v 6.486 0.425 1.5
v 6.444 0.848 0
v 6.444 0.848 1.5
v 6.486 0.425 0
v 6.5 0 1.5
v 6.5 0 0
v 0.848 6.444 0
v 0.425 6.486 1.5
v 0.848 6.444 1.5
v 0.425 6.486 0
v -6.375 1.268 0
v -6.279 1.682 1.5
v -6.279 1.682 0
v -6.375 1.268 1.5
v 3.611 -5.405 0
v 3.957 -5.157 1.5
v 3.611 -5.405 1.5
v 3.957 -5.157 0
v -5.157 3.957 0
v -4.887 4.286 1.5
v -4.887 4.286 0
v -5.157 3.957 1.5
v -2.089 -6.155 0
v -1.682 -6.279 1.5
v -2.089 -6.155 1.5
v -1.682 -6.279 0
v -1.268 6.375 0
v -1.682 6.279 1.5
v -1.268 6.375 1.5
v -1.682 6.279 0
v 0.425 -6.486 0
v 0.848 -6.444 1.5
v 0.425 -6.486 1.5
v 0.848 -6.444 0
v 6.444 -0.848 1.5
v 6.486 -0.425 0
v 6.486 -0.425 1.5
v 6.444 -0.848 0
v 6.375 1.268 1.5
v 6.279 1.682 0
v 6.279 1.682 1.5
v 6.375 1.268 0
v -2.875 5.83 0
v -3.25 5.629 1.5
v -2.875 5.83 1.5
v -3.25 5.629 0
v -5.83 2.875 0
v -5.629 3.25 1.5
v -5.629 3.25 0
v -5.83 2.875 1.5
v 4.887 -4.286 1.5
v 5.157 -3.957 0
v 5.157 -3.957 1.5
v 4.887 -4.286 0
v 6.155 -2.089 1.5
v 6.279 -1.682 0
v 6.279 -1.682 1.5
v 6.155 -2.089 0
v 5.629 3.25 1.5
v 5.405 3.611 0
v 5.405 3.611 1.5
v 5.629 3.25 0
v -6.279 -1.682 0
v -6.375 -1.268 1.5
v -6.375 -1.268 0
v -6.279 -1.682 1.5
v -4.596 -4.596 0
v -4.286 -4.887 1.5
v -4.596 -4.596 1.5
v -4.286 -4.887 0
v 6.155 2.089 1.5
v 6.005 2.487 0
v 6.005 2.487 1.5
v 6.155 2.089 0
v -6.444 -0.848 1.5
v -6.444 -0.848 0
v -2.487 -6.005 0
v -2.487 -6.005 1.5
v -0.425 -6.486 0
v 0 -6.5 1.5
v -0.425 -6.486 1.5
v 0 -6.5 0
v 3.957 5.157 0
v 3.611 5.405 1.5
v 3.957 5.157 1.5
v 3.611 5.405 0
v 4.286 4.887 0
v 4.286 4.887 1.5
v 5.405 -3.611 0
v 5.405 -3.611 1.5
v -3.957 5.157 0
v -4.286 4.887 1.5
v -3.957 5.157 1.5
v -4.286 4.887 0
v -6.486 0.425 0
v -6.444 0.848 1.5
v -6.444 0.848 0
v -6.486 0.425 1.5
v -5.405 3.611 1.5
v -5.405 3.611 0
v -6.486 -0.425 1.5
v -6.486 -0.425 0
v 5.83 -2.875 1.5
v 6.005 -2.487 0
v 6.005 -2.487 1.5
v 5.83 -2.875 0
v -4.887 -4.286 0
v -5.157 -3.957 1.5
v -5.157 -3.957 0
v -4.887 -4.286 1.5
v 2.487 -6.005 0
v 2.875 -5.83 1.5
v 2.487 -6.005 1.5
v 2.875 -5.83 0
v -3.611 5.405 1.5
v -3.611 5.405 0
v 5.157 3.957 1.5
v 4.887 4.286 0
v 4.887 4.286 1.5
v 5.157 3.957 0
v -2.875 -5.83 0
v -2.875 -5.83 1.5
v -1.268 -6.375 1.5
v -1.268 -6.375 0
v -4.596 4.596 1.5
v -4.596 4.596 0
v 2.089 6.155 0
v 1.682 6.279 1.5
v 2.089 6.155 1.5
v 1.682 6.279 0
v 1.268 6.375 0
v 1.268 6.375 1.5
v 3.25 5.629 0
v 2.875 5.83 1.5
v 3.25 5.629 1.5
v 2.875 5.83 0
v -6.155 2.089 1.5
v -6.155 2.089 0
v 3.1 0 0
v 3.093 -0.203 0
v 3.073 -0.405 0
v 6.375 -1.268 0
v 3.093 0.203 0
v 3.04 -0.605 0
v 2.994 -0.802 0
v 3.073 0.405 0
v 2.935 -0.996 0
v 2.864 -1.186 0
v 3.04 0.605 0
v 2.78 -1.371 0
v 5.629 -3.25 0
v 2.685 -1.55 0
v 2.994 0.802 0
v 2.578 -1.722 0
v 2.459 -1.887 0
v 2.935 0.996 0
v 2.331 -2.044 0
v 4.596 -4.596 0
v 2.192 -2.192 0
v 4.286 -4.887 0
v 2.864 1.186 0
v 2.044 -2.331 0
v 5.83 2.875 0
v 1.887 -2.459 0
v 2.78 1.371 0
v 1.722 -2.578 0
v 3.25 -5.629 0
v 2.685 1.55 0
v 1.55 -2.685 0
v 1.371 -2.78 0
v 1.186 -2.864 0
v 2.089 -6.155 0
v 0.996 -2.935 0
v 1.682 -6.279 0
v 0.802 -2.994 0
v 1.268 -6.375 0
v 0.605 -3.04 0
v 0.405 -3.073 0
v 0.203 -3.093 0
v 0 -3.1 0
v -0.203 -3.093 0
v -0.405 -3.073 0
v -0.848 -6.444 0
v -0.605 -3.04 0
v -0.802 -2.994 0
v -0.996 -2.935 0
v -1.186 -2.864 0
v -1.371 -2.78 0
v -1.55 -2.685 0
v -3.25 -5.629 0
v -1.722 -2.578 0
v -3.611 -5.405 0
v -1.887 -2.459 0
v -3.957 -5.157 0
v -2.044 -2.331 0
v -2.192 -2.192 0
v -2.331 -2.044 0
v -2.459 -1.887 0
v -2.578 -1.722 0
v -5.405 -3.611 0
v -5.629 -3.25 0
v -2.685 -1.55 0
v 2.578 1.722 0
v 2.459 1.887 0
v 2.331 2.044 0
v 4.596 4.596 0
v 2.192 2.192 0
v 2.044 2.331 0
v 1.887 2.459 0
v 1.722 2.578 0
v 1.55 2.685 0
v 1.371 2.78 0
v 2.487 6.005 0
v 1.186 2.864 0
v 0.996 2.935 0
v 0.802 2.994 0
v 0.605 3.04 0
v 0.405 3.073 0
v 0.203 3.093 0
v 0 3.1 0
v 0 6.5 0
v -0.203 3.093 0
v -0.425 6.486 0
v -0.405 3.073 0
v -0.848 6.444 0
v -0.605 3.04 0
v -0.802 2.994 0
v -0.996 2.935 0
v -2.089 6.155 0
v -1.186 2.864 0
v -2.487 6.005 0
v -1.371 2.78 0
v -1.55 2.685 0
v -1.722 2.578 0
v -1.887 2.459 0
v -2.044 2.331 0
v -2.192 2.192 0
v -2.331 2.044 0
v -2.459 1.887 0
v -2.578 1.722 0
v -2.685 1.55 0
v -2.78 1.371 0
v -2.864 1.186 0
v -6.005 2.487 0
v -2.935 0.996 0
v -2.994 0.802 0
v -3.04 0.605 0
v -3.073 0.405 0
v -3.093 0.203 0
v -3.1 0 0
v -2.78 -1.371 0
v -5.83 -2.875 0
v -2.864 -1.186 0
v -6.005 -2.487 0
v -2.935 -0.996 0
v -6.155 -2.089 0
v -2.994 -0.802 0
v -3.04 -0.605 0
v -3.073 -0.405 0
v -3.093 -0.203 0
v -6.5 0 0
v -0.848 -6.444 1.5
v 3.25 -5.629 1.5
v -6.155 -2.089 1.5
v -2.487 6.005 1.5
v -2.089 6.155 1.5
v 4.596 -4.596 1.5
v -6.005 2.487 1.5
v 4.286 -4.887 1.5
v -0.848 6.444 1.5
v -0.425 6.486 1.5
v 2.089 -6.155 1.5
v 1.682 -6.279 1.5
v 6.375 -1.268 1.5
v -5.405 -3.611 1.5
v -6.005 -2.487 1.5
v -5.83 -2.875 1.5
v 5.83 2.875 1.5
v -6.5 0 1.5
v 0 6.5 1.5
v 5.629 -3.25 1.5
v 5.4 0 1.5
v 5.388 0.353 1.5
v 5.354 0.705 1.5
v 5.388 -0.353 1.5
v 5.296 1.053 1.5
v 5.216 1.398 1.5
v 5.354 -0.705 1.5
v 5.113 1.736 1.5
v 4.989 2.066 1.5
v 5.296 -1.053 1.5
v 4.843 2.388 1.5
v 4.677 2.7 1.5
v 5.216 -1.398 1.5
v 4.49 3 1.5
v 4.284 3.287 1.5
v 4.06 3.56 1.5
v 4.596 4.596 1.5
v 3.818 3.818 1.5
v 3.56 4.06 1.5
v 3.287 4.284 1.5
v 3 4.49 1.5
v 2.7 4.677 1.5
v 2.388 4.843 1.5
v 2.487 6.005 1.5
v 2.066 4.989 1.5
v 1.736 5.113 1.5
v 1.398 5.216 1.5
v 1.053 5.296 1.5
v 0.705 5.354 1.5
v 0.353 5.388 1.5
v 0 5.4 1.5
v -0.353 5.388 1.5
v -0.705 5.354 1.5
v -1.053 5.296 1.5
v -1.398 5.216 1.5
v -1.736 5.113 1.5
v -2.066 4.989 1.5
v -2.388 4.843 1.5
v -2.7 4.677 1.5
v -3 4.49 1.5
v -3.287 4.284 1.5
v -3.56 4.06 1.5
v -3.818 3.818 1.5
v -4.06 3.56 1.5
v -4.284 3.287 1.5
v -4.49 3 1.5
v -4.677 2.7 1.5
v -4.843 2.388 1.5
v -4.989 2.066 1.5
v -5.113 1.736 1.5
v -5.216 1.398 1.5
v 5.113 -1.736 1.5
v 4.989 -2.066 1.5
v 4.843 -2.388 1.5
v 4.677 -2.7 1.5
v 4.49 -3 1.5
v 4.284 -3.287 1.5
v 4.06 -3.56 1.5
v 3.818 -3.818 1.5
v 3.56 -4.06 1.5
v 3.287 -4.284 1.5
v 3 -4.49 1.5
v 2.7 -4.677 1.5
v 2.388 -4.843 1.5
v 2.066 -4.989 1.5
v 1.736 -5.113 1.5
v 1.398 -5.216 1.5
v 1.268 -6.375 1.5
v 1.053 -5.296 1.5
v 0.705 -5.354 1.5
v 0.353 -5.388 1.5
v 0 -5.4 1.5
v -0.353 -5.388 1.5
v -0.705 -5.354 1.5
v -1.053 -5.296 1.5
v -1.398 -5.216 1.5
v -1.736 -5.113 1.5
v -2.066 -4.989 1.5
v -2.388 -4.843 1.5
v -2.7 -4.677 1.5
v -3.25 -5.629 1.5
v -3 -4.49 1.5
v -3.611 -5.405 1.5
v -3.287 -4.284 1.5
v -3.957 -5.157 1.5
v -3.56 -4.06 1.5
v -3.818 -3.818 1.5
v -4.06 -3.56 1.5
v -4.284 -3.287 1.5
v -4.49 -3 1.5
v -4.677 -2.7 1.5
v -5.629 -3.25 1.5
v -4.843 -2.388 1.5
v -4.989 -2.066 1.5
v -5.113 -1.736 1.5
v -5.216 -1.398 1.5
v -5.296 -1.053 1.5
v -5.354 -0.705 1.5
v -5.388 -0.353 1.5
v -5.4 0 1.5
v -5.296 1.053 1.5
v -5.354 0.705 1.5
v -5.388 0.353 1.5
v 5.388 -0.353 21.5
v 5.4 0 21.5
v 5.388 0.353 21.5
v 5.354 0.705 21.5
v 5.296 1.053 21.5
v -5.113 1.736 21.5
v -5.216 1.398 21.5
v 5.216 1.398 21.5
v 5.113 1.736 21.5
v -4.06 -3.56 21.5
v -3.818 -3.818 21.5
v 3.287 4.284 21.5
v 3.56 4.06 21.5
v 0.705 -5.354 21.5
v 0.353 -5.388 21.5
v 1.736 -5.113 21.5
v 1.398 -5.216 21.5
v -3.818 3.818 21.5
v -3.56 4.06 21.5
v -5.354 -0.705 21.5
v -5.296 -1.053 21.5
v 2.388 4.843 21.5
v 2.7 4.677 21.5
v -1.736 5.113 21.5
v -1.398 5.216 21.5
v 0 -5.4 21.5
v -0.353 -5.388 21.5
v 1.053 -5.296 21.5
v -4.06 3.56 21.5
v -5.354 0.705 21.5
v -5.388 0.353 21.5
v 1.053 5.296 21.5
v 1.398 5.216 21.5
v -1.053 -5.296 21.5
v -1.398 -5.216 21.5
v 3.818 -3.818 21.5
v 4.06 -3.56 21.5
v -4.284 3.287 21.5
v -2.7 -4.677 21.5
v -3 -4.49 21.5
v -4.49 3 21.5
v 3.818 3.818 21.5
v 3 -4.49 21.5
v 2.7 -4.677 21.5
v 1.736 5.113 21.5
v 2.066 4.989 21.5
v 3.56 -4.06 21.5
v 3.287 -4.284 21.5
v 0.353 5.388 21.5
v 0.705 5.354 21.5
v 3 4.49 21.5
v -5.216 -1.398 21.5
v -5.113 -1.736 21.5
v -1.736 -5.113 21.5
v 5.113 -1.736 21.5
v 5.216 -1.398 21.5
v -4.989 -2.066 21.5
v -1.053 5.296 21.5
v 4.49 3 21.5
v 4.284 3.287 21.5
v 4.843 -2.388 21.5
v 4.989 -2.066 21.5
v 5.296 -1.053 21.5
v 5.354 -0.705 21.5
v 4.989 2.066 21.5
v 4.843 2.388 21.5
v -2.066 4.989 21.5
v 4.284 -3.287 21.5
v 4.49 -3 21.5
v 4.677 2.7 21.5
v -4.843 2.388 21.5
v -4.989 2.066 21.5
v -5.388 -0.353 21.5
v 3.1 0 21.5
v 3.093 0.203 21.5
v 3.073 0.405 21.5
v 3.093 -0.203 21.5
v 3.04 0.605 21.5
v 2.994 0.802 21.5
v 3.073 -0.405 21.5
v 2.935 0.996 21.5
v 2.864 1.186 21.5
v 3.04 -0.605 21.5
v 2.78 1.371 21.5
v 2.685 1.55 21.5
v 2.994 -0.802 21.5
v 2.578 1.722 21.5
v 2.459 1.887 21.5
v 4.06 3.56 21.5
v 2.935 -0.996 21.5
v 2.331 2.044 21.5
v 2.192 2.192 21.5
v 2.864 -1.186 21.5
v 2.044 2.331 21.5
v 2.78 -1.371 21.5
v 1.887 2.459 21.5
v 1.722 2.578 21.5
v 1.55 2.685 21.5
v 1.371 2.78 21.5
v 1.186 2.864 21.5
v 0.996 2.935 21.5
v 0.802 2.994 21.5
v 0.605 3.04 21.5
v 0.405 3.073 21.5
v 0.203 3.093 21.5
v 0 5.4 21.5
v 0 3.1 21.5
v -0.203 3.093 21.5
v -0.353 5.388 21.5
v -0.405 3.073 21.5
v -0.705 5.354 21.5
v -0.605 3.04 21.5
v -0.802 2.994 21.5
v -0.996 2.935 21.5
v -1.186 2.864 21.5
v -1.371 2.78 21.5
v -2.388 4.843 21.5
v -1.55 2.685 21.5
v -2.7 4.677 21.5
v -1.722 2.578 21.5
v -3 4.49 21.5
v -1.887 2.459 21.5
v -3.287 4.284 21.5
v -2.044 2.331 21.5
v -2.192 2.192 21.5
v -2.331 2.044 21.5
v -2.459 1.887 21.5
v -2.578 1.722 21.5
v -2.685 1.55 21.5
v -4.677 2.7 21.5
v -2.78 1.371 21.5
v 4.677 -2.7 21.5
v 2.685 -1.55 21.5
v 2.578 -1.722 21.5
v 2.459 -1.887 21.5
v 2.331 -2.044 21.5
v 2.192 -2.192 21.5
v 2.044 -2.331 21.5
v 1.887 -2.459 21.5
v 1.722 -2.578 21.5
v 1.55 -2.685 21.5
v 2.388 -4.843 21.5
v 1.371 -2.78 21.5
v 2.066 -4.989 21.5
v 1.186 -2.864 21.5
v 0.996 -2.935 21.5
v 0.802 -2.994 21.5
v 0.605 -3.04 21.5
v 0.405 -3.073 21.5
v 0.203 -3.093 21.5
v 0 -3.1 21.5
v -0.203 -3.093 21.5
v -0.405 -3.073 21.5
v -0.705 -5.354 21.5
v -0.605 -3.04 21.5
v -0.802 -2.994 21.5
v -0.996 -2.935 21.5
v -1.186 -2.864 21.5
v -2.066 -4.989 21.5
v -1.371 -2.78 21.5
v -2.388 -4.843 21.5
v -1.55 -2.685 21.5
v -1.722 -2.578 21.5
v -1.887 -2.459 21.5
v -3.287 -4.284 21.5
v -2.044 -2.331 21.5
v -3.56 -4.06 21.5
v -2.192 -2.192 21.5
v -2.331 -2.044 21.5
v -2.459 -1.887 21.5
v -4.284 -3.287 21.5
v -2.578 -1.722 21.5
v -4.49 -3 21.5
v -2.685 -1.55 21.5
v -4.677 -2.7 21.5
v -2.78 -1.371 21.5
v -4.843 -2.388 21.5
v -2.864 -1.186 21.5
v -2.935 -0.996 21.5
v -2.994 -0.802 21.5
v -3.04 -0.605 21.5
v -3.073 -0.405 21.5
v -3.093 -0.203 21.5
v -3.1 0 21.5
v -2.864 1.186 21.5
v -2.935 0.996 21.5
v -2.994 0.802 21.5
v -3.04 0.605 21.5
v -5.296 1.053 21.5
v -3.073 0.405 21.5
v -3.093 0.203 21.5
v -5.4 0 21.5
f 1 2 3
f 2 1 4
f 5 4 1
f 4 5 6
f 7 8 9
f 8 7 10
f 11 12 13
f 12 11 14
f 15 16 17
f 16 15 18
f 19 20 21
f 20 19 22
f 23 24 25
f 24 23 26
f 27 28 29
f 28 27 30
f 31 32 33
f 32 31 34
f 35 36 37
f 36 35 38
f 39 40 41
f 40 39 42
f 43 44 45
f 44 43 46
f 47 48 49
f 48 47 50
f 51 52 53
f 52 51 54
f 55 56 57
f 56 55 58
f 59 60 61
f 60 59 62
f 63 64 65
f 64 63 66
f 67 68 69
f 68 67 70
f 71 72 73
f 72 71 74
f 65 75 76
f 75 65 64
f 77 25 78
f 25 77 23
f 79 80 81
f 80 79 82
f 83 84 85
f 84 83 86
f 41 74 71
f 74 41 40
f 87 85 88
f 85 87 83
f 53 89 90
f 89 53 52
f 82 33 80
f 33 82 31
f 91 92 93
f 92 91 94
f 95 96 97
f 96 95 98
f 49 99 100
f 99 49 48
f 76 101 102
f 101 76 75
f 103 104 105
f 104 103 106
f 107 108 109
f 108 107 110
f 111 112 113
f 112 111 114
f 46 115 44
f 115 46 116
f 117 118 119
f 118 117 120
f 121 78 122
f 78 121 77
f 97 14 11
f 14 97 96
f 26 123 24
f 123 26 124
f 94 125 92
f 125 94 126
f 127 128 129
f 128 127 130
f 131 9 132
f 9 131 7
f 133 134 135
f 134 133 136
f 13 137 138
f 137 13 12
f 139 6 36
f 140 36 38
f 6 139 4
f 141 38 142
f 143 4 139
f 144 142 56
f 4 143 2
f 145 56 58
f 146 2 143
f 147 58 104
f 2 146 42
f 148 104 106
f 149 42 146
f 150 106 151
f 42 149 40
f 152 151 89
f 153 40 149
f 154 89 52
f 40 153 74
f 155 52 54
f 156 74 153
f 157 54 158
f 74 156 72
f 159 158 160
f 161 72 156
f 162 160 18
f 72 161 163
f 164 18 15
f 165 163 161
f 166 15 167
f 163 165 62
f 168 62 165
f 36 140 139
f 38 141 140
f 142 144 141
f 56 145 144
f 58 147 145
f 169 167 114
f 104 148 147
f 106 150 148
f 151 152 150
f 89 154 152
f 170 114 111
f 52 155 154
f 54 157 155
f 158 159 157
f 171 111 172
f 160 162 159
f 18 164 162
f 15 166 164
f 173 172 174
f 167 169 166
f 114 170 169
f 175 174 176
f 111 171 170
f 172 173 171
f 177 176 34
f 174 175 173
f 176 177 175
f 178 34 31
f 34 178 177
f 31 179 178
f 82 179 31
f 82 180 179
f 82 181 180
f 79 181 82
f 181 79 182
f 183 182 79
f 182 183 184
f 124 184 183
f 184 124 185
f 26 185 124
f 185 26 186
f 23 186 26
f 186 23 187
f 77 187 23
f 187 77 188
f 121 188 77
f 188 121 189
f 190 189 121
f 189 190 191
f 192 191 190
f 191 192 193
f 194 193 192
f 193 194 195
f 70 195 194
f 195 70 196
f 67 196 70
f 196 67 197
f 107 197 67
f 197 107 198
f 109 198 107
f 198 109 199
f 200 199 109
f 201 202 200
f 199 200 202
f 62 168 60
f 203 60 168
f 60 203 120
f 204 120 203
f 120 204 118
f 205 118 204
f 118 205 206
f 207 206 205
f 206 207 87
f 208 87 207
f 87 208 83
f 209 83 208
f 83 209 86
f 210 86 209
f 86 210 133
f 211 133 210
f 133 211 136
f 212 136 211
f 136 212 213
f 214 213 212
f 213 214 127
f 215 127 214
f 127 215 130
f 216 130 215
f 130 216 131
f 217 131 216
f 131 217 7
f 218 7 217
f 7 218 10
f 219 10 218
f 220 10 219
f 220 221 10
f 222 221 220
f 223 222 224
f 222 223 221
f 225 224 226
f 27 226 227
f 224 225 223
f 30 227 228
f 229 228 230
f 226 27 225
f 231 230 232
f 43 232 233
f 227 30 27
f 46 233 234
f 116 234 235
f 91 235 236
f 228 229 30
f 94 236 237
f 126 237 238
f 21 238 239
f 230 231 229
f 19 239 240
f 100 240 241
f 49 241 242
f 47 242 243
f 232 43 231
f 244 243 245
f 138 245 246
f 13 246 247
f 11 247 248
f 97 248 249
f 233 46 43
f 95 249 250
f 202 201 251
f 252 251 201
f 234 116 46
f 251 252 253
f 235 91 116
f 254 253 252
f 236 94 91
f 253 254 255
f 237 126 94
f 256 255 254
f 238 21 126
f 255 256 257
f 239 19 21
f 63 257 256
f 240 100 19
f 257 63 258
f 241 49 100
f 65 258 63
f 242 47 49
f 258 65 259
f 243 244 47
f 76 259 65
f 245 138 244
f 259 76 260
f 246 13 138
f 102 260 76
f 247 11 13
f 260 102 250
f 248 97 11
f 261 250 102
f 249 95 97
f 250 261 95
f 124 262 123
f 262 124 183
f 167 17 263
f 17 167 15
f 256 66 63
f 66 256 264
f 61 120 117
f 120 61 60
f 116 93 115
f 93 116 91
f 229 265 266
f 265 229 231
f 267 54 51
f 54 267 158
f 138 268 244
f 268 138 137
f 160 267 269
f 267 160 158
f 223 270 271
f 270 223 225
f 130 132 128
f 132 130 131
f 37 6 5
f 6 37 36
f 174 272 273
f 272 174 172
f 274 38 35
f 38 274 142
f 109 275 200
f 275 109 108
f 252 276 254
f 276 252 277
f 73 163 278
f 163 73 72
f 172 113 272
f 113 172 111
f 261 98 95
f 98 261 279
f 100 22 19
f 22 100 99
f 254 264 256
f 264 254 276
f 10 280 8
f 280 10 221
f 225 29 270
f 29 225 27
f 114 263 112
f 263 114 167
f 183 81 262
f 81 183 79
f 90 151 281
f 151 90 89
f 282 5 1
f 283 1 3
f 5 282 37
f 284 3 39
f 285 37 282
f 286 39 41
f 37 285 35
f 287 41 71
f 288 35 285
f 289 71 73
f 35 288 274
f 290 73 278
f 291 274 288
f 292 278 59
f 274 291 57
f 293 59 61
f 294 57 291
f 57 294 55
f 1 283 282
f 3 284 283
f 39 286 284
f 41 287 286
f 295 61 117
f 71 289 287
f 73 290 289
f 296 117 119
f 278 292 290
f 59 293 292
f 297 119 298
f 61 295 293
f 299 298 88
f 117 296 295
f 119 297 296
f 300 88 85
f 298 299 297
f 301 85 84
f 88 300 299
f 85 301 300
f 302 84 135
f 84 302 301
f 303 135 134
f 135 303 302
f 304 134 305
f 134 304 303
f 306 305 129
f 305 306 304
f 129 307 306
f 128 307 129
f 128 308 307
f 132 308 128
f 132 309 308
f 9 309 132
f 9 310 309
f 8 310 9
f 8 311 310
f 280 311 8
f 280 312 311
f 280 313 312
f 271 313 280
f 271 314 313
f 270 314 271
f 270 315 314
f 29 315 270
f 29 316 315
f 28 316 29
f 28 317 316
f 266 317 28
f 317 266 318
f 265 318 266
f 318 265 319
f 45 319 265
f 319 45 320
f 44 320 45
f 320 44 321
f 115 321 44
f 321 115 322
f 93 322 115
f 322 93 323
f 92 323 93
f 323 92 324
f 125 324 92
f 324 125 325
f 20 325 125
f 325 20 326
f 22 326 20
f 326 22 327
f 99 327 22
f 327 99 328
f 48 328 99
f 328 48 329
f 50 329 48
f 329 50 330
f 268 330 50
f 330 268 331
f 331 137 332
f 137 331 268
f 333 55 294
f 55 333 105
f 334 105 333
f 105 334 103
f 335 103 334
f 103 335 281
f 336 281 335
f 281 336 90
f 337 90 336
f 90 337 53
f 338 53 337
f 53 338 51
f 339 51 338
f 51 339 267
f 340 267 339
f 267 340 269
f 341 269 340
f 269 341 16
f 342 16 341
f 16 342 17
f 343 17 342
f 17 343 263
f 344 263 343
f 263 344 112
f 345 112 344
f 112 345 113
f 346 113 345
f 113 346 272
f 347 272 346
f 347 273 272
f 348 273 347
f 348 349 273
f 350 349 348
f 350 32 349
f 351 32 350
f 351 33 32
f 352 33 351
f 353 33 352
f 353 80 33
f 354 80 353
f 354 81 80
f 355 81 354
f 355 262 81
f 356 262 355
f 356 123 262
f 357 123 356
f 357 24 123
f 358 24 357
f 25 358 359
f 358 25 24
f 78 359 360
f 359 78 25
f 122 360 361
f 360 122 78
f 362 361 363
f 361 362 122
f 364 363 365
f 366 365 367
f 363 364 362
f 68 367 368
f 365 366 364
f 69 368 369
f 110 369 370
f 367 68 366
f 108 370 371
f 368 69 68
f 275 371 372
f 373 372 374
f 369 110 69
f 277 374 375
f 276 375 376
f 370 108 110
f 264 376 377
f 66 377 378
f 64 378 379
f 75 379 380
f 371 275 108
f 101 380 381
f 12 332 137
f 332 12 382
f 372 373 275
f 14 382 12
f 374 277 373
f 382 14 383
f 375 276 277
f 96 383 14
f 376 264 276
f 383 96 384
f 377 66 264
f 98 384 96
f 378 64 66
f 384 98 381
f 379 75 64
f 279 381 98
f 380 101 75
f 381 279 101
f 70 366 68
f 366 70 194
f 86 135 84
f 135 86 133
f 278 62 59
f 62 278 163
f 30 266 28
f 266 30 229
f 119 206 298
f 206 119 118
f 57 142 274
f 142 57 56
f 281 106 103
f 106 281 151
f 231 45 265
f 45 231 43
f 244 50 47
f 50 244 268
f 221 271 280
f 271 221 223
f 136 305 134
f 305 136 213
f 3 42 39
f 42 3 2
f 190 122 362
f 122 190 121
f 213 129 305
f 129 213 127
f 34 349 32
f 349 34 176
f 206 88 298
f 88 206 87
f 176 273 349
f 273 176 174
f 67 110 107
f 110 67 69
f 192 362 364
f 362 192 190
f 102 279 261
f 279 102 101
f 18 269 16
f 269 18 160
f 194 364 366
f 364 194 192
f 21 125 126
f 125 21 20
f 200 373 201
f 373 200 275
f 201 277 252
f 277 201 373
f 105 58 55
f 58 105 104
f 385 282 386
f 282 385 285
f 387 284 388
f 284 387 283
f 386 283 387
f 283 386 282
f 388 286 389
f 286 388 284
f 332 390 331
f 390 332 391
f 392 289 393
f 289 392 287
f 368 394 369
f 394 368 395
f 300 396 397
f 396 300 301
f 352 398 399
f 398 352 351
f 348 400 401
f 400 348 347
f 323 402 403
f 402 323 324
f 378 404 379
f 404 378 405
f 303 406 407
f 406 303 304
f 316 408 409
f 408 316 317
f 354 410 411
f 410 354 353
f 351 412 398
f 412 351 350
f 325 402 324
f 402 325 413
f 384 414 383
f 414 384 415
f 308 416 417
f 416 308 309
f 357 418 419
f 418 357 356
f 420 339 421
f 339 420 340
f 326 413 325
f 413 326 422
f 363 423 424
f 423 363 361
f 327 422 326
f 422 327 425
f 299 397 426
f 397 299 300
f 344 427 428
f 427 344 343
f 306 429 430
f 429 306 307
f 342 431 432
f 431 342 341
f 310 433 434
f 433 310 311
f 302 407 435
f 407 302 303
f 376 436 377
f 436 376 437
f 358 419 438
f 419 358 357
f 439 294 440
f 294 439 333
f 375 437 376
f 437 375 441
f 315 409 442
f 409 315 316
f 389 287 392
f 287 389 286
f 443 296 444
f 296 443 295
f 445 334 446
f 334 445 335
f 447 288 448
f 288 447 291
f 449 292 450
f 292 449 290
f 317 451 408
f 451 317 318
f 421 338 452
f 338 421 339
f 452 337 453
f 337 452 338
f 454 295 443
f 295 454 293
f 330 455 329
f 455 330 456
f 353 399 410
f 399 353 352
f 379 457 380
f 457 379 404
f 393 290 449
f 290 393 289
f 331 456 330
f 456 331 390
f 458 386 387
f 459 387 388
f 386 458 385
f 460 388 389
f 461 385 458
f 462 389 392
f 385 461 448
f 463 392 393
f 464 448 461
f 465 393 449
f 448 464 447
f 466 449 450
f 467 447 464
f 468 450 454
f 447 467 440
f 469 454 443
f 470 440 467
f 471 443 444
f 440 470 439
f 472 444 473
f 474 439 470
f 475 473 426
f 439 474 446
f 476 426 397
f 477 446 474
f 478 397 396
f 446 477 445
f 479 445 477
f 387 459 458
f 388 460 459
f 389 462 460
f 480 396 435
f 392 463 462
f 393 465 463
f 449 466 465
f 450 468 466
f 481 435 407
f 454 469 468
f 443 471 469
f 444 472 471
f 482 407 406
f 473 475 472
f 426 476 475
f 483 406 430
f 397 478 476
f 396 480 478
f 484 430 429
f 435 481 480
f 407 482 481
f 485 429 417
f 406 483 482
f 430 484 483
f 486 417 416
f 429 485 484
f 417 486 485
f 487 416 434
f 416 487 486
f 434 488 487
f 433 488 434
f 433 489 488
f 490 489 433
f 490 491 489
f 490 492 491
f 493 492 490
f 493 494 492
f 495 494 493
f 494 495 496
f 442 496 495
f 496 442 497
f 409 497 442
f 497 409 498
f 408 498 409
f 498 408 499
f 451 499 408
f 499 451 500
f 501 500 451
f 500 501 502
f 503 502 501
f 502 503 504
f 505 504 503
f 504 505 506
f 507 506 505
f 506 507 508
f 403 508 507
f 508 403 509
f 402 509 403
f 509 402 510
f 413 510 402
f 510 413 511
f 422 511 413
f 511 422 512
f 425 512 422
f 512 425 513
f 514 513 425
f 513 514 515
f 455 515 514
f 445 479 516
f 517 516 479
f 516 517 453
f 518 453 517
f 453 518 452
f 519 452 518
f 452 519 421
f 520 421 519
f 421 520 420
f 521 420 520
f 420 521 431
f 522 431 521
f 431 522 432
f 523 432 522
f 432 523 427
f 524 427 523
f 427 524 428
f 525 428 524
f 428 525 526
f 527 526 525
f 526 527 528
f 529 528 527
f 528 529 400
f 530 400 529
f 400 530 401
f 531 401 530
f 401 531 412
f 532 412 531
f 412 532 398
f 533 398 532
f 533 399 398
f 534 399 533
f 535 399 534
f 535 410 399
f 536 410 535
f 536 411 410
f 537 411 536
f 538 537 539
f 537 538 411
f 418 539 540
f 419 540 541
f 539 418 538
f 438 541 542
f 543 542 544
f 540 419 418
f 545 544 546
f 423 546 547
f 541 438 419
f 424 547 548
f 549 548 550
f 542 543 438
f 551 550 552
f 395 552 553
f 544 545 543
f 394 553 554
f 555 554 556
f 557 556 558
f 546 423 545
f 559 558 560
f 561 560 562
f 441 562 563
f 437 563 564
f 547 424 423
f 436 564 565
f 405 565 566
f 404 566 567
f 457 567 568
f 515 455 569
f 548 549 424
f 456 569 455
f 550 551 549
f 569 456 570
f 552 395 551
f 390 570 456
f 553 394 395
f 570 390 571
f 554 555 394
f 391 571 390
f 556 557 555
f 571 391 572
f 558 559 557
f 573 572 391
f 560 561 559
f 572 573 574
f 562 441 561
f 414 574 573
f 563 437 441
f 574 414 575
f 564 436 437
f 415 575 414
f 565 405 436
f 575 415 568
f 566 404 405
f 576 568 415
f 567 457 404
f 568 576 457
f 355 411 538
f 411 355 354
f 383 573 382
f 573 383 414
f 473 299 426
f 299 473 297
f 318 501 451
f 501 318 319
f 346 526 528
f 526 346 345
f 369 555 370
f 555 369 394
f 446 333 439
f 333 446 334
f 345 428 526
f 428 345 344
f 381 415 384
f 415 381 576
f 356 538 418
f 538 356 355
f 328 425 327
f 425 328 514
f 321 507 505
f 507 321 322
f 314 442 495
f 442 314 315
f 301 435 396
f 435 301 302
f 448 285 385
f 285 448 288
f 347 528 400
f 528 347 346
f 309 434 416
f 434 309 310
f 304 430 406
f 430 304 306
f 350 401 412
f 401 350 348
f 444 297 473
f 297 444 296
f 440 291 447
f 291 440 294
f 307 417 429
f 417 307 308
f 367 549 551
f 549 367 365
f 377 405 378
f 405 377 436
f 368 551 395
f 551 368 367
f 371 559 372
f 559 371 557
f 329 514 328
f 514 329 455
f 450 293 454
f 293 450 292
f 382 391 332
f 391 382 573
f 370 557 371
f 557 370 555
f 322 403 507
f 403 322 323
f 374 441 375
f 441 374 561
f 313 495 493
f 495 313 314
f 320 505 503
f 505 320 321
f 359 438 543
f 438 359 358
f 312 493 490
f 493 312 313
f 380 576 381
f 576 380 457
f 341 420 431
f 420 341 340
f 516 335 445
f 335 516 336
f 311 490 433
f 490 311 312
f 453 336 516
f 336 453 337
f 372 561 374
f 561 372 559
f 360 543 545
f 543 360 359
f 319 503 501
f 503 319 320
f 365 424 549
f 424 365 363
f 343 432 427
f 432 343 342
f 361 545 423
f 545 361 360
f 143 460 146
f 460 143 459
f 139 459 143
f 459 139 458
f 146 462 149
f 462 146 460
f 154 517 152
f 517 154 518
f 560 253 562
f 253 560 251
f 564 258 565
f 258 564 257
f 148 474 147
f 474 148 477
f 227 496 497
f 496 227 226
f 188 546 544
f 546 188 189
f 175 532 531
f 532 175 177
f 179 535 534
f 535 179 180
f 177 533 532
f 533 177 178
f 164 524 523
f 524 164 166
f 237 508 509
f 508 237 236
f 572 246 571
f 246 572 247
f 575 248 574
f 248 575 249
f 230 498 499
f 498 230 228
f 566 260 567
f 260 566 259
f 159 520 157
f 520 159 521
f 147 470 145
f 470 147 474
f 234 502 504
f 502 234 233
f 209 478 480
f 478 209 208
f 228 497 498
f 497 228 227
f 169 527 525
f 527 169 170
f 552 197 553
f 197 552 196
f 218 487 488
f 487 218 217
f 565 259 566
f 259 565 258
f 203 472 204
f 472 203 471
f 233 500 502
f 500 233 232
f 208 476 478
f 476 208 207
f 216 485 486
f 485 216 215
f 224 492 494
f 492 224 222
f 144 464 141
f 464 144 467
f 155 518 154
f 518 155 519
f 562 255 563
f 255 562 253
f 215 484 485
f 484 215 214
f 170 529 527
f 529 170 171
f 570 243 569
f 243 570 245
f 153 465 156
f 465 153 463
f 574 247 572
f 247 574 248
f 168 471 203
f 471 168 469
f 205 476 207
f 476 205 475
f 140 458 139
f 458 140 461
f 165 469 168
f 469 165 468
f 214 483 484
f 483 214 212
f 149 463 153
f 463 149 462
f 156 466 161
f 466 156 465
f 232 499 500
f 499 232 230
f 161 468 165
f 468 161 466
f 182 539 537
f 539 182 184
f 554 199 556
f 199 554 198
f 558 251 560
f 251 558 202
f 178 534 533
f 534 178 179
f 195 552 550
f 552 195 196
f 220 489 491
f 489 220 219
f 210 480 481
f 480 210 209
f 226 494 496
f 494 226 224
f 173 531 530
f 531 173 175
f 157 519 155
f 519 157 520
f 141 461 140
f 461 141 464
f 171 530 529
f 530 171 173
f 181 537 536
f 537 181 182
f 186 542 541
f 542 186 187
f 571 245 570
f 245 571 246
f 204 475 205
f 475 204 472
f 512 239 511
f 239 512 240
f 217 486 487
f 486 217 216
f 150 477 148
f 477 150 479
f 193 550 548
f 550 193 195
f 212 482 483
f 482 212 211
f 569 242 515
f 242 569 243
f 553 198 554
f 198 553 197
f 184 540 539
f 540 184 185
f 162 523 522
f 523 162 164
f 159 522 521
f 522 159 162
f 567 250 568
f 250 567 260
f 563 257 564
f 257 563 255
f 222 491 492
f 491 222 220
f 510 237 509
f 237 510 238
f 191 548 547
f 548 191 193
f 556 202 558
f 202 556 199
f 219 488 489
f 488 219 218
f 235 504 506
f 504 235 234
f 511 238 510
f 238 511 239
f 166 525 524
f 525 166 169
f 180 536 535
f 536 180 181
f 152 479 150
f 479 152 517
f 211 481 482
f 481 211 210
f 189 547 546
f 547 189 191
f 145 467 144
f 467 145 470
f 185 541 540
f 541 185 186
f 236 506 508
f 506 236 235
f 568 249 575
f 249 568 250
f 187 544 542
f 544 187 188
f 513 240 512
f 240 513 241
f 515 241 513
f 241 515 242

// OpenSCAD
// PCR tube adapter sleeve - fits a 0.2 mL tube in a 1.5 mL rack hole
// Print orientation: collar on the bed (z = 0), sleeve body builds upward.

// ---------- Dimensions (mm) ----------
collar_d        = 13;     // collar outer diameter
collar_t        = 1.5;    // collar thickness (z = 0 to 1.5)
sleeve_od       = 10.8;   // sleeve outer diameter
sleeve_h        = 20;     // sleeve body height above collar (z = 1.5 to 21.5)
bore_d          = 6.2;    // through-bore diameter
eps             = 0.5;    // cutter overshoot past faces

$fn = 96;

// ---------- Model ----------
difference() {
    union() {
        // Collar: disc on the bed, centred in XY
        cylinder(d = collar_d, h = collar_t);

        // Sleeve body: tube rising from the top face of the collar
        translate([0, 0, collar_t])
            cylinder(d = sleeve_od, h = sleeve_h);
    }

    // Straight bore through the full height, open at both ends
    translate([0, 0, -eps])
        cylinder(d = bore_d, h = sleeve_h + collar_t + 2 * eps);
}
